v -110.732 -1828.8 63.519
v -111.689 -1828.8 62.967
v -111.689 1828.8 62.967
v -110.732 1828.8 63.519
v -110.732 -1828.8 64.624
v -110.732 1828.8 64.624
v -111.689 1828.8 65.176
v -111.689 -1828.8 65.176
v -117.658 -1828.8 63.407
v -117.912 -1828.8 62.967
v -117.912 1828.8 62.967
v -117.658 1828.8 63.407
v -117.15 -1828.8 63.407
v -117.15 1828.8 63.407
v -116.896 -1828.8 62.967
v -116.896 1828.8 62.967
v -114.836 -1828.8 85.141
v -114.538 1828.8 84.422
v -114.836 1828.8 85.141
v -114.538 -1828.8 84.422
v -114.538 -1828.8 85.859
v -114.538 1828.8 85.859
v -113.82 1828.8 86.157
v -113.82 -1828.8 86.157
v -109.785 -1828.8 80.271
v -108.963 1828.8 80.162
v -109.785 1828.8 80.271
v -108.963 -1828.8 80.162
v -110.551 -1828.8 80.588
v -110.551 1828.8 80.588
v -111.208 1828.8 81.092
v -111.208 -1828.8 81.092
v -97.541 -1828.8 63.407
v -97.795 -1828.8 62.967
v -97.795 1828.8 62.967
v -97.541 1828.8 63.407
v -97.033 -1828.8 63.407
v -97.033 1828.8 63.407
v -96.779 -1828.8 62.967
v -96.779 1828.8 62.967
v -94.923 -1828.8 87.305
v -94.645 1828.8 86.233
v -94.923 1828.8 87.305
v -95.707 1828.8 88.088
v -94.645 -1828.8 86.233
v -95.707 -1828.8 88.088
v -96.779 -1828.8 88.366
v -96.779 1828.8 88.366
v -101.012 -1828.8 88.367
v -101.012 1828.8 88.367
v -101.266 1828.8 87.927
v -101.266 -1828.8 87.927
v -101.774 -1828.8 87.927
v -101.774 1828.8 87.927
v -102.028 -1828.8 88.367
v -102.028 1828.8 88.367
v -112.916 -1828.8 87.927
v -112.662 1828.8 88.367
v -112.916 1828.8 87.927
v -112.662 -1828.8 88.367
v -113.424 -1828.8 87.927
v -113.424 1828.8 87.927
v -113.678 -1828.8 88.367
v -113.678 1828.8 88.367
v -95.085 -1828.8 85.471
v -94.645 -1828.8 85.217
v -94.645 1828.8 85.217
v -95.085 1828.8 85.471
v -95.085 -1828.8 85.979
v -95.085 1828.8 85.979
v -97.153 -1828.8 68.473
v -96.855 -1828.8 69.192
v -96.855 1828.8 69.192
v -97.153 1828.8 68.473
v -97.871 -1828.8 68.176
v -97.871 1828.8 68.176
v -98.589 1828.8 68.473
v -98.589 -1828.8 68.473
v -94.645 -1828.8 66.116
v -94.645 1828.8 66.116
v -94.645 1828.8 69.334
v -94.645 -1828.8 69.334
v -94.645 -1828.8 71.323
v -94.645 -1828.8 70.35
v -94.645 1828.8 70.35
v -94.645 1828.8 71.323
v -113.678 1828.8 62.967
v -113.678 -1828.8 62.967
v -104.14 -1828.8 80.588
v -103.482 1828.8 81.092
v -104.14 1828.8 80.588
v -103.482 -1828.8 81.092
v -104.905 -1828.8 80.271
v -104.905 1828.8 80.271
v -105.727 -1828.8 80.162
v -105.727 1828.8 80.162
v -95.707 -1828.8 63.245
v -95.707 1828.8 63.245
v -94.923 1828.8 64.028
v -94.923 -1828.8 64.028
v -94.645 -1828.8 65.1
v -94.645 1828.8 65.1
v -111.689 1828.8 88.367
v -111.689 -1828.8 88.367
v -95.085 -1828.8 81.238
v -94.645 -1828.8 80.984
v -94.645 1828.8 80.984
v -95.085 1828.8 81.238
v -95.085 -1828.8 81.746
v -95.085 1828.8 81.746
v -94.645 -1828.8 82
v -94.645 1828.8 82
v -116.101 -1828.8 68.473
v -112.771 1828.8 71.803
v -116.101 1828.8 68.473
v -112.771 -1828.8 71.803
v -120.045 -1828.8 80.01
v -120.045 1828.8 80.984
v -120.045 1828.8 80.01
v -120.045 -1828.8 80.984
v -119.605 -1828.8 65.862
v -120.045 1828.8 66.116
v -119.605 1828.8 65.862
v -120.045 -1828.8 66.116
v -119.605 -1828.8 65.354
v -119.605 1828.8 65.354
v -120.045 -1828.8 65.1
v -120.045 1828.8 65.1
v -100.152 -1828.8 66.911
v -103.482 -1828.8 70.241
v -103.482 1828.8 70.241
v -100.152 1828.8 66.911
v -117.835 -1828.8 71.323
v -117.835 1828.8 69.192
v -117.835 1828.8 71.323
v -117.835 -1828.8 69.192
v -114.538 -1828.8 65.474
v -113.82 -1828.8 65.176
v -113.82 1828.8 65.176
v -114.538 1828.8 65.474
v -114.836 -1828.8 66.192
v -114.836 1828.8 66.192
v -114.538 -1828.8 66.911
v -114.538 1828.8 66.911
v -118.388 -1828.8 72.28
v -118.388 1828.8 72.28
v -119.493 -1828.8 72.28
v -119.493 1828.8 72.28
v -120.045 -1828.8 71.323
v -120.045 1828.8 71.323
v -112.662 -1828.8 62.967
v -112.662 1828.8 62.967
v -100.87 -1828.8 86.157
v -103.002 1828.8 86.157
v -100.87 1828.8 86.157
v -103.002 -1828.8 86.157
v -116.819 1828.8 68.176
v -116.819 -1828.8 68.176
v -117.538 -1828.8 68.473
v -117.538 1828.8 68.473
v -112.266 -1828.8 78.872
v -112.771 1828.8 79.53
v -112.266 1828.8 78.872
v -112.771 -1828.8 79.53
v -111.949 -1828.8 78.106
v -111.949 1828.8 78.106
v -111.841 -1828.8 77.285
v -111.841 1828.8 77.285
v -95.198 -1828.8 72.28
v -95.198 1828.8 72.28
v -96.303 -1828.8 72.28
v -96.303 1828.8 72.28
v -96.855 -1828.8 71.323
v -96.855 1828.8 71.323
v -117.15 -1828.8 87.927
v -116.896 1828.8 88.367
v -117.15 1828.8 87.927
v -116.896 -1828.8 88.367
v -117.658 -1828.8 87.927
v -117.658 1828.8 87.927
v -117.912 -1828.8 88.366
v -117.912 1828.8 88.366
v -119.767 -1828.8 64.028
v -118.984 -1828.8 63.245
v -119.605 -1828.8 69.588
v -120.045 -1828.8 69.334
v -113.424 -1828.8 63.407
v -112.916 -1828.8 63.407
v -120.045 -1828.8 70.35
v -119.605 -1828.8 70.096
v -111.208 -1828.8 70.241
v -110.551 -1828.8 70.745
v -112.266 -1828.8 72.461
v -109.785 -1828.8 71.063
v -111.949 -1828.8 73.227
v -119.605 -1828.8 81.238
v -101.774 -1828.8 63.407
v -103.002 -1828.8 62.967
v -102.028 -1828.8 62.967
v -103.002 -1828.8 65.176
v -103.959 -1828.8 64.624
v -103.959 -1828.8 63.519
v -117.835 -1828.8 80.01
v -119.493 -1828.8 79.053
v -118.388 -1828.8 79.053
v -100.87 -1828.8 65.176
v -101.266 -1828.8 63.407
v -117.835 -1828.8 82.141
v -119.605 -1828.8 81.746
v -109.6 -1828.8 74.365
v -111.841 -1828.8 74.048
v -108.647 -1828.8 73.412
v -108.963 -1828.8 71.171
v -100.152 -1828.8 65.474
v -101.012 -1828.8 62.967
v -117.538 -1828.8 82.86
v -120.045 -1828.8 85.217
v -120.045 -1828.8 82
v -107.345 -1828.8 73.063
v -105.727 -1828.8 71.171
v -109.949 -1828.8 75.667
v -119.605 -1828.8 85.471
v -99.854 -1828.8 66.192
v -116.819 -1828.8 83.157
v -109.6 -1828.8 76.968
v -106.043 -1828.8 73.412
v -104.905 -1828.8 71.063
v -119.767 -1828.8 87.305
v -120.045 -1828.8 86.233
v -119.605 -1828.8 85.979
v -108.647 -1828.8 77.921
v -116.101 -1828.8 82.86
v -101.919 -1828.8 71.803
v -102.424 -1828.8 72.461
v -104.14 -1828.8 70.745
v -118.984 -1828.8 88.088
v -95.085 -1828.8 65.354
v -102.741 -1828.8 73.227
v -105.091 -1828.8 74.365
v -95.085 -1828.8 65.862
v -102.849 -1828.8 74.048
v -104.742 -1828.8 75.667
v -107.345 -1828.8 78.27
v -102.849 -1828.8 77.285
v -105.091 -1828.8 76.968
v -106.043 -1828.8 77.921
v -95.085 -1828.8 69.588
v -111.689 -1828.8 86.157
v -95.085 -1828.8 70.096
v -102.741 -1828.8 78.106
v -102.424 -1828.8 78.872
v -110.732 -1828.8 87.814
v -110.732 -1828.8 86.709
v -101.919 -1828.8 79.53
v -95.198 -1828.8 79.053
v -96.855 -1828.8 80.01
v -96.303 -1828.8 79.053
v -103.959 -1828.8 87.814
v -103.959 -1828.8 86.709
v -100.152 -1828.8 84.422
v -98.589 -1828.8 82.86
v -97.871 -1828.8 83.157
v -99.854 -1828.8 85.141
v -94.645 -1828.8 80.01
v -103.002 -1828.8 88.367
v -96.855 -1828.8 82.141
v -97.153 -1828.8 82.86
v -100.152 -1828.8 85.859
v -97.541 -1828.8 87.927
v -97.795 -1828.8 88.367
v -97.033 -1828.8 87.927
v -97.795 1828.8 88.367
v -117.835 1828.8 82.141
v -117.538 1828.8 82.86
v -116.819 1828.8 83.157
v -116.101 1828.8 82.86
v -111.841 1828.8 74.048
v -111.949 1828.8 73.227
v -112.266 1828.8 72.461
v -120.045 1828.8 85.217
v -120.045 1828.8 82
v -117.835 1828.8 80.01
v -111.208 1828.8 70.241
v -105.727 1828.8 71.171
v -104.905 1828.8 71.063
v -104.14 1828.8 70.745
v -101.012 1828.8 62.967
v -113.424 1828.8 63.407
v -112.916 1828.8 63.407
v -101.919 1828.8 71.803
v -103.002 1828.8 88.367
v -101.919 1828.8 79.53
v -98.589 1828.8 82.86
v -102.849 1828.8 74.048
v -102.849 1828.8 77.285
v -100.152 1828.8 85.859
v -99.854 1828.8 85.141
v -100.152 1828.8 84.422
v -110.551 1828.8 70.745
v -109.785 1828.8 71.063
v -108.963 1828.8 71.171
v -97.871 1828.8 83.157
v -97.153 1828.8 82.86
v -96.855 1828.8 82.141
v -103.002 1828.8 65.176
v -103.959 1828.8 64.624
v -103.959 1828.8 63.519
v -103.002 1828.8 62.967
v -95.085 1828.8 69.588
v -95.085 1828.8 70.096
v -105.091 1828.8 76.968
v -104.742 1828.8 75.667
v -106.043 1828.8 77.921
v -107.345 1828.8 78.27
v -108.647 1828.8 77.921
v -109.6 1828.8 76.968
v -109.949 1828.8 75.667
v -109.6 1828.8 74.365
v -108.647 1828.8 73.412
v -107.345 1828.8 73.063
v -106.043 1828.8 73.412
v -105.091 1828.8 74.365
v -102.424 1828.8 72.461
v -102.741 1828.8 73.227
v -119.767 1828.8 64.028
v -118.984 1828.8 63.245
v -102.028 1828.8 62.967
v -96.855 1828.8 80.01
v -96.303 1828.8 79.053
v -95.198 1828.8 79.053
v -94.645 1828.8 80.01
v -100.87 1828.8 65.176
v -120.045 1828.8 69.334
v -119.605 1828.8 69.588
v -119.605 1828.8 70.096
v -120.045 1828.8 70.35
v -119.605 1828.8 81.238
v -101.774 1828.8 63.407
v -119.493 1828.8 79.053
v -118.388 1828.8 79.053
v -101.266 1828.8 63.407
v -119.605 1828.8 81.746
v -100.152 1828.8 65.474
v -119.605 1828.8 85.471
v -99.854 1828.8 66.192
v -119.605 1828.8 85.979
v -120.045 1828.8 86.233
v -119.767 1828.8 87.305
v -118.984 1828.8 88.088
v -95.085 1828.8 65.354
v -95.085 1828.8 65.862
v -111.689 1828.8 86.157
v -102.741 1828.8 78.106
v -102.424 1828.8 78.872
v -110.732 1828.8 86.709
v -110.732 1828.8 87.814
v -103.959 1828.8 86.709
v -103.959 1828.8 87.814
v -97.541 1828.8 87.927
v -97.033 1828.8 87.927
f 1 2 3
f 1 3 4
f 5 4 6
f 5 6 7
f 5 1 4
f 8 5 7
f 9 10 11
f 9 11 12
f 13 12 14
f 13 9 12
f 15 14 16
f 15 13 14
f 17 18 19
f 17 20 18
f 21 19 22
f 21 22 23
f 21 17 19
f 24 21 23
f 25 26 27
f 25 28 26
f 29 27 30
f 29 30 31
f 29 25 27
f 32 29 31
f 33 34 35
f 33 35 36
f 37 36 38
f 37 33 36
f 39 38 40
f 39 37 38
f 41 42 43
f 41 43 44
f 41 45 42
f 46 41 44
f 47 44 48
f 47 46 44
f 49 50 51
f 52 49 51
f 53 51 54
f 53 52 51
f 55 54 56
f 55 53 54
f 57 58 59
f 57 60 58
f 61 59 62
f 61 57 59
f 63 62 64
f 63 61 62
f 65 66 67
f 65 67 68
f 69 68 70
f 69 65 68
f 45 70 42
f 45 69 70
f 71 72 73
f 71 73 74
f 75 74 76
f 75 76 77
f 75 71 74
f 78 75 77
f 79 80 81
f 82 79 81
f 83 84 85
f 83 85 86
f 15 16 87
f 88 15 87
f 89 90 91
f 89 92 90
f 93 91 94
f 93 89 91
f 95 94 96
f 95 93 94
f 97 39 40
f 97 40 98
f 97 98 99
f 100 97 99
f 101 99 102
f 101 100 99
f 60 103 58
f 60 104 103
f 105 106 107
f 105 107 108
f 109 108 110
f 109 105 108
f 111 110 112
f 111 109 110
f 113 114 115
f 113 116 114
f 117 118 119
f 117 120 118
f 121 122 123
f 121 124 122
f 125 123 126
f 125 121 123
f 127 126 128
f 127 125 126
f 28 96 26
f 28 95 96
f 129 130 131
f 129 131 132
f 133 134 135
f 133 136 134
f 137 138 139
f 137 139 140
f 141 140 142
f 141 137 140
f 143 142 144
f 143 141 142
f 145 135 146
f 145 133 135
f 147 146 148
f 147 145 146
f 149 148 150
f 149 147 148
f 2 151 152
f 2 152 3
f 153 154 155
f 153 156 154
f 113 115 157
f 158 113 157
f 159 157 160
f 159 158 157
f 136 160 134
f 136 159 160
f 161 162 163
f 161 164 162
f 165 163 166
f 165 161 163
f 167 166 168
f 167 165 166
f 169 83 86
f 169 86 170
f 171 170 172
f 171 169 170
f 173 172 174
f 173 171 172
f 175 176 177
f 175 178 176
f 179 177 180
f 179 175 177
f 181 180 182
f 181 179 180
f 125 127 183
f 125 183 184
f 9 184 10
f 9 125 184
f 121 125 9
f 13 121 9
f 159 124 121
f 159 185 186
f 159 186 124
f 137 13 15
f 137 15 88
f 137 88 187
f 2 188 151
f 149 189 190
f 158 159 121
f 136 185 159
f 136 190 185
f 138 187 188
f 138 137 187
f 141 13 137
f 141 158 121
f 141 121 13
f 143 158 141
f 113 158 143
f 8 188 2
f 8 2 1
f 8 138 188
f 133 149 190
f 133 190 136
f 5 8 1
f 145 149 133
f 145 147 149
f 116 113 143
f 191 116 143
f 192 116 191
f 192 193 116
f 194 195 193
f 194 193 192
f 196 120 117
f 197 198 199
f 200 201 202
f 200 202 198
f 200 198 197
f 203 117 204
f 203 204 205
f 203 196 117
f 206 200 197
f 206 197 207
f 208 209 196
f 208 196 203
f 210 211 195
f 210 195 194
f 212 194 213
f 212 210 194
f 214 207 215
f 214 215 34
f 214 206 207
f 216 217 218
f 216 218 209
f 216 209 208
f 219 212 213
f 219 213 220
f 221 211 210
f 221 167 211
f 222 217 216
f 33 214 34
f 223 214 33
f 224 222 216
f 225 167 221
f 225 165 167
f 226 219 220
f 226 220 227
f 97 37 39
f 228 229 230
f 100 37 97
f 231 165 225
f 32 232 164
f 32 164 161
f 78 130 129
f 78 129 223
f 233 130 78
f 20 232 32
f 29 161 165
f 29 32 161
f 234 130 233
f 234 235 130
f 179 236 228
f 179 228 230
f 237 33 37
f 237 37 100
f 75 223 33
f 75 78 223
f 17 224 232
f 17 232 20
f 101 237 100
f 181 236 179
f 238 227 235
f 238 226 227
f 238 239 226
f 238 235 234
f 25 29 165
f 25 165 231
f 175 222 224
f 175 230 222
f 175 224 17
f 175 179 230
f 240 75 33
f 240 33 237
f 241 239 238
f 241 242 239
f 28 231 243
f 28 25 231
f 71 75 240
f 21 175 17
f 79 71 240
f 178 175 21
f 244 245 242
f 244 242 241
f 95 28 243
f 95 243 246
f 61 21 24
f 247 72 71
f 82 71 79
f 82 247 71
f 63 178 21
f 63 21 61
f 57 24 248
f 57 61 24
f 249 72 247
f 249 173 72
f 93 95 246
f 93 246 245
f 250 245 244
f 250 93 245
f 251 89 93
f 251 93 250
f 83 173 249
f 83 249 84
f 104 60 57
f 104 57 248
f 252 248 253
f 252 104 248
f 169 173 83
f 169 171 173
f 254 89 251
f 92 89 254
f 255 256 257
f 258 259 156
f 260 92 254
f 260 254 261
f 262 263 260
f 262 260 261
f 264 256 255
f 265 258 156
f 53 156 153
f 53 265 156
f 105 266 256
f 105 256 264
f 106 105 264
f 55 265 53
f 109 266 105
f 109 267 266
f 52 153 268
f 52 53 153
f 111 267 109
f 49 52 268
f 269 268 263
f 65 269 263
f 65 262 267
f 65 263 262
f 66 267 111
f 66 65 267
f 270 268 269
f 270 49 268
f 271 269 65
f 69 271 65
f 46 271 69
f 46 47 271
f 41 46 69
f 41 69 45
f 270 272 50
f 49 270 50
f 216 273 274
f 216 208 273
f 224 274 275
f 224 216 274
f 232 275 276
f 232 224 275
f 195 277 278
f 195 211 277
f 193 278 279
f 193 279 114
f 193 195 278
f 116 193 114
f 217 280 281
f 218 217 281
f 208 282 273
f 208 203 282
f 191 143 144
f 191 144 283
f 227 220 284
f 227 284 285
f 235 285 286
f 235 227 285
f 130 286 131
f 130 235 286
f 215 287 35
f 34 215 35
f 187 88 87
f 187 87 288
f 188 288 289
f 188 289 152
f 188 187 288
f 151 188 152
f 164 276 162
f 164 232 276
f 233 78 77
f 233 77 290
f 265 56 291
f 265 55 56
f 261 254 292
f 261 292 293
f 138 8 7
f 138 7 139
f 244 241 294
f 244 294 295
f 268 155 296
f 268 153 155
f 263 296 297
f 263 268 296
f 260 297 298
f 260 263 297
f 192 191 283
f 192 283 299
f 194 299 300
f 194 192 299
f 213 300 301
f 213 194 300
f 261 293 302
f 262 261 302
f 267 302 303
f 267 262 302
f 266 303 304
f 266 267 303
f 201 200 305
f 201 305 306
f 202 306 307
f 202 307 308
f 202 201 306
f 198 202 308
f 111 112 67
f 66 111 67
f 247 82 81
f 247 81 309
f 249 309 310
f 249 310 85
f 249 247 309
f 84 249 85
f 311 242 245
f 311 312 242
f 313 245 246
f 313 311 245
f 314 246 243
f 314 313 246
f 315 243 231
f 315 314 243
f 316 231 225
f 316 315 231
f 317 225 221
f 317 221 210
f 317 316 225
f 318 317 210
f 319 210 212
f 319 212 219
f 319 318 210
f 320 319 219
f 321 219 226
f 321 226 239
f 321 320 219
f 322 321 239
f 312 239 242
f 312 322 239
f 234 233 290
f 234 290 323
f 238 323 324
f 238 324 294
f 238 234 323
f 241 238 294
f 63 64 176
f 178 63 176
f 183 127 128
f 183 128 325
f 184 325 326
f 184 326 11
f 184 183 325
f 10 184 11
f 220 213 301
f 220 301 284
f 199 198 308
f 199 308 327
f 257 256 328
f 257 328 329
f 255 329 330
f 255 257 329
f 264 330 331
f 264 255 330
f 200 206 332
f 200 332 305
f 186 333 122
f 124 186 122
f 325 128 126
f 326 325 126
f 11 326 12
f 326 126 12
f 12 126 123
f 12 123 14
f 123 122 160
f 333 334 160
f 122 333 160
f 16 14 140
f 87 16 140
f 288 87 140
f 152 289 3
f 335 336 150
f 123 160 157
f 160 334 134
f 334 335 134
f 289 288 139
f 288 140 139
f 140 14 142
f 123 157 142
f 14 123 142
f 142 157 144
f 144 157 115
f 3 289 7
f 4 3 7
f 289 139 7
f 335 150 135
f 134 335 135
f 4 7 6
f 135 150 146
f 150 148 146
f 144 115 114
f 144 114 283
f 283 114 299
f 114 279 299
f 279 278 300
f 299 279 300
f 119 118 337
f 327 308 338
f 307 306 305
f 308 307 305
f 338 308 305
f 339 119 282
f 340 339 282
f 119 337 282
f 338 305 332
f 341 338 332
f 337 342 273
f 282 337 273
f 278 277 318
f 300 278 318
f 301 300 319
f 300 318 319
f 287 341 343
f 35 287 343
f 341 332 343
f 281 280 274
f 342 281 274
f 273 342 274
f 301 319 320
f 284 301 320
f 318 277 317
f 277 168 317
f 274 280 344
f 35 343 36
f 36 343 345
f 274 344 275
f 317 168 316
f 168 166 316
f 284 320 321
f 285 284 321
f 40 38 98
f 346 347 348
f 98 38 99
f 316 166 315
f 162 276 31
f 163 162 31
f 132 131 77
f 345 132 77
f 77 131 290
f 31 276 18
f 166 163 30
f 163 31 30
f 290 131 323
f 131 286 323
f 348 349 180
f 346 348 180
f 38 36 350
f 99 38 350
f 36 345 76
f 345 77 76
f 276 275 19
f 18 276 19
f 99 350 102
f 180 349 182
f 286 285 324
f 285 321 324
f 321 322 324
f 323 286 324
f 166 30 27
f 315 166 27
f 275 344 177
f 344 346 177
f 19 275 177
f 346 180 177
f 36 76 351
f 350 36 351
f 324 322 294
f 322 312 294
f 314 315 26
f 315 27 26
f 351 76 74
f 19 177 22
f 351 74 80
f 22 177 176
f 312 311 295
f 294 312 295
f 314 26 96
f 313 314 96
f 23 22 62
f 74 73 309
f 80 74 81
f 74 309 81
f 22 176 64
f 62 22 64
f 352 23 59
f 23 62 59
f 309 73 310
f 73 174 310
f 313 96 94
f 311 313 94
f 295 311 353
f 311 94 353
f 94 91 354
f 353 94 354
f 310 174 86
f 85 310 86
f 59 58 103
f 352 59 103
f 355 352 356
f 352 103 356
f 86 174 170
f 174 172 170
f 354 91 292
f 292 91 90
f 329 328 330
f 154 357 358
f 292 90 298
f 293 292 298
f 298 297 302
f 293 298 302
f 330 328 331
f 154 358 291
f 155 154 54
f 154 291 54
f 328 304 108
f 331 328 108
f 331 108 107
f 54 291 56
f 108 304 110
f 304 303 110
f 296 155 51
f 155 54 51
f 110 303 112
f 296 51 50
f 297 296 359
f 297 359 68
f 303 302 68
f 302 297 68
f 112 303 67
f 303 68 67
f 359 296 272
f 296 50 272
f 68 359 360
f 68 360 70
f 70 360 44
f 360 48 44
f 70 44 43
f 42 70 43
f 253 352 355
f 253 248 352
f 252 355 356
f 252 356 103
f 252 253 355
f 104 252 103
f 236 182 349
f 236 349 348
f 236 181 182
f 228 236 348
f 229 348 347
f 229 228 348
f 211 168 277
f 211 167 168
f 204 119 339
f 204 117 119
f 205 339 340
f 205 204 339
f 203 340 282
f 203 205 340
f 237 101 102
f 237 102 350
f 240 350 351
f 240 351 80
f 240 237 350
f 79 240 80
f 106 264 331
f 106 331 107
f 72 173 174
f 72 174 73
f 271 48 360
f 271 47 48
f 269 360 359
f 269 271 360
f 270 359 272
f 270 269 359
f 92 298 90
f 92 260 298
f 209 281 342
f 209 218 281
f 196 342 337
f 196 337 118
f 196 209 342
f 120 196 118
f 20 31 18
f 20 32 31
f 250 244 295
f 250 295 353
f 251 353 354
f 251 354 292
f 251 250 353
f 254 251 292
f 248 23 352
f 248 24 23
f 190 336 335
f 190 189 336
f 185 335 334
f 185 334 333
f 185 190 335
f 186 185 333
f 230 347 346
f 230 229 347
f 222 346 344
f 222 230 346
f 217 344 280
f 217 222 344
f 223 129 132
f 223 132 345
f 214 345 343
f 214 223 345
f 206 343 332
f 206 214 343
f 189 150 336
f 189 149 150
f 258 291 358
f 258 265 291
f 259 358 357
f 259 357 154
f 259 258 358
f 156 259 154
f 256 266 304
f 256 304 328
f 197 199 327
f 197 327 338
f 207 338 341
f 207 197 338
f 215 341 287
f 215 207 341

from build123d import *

# Parameters (mm, degrees)
F0_R     = 2.6035
F1_DEPTH = 1828.8


# Not quite as in the source:
# - ends of sketch curves that miss each other by under 0.0002 mm in the source are joined


with BuildPart() as f1:
    # F0 (on Front) → F1 (new body, symmetric)
    with BuildSketch(Plane.XZ):
        with BuildLine():
            ThreePointArc((-120.045226, 66.1162), (-119.5372260057, 65.6082762), (-120.0450736, 65.1002000229))
            ThreePointArc((-120.0450736, 65.1002000229), (-119.4277485161, 63.5840774839), (-117.9116260074, 62.9667530175))
            ThreePointArc((-117.9116260074, 62.9667530175), (-117.4035498, 63.4745999943), (-116.895626, 62.9666))
            Line((-116.895626, 62.9666), (-113.6783096, 62.9666))
            ThreePointArc((-113.6783096, 62.9666), (-113.1703096, 63.4746), (-112.6623096, 62.9666))
            Line((-112.6623096, 62.9666), (-111.688626, 62.9666))
            ThreePointArc((-111.688626, 62.9666), (-110.583726, 64.0715), (-111.688626, 65.1764))
            Line((-111.688626, 65.1764), (-113.8200162, 65.1764))
            ThreePointArc((-113.8200162, 65.1764), (-114.758677805, 65.8035936327), (-114.5384366897, 66.9108204897))
            Line((-114.5384366897, 66.9108204897), (-111.2083882, 70.2408552))
            ThreePointArc((-111.2083882, 70.2408552), (-110.1783528978, 70.9291175157), (-108.963333, 71.1708))
            Line((-108.963333, 71.1708), (-105.727119, 71.1708))
            ThreePointArc((-105.727119, 71.1708), (-104.5120991022, 70.9291175157), (-103.4820549697, 70.2408640303))
            Line((-103.4820549697, 70.2408640303), (-100.1520222, 66.9108136))
            ThreePointArc((-100.1520222, 66.9108136), (-99.931774195, 65.8035936327), (-100.8704358, 65.1764))
            Line((-100.8704358, 65.1764), (-103.001826, 65.1764))
            ThreePointArc((-103.001826, 65.1764), (-104.106726, 64.0715), (-103.001826, 62.9666))
            Line((-103.001826, 62.9666), (-102.0281424, 62.9666))
            ThreePointArc((-102.0281424, 62.9666), (-101.5201424, 63.4746), (-101.0121424, 62.9666))
            Line((-101.0121424, 62.9666), (-97.794826, 62.9666))
            ThreePointArc((-97.794826, 62.9666), (-97.2869022, 63.4745999943), (-96.7788260229, 62.9667524))
            ThreePointArc((-96.7788260229, 62.9667524), (-95.2627034839, 63.5840774839), (-94.6453790175, 65.1001999926))
            ThreePointArc((-94.6453790175, 65.1001999926), (-95.1532259943, 65.6082762), (-94.645226, 66.1162))
            Line((-94.645226, 66.1162), (-94.645226, 69.3335164))
            ThreePointArc((-94.645226, 69.3335164), (-95.153226, 69.8415164), (-94.645226, 70.3495164))
            Line((-94.645226, 70.3495164), (-94.645226, 71.3232))
            ThreePointArc((-94.645226, 71.3232), (-95.750126, 72.4281), (-96.855026, 71.3232))
            Line((-96.855026, 71.3232), (-96.855026, 69.1918098))
            ThreePointArc((-96.855026, 69.1918098), (-97.4822196327, 68.253148195), (-98.5894464897, 68.4733893103))
            Line((-98.5894464897, 68.4733893103), (-101.9194812, 71.8034378))
            ThreePointArc((-101.9194812, 71.8034378), (-102.6077435157, 72.8334731022), (-102.849426, 74.048493))
            Line((-102.849426, 74.048493), (-102.849426, 77.284707))
            ThreePointArc((-102.849426, 77.284707), (-102.6077435157, 78.4997268978), (-101.9194900303, 79.5297710303))
            Line((-101.9194900303, 79.5297710303), (-98.5894396, 82.8598038))
            ThreePointArc((-98.5894396, 82.8598038), (-97.4822196327, 83.080051805), (-96.855026, 82.1413902))
            Line((-96.855026, 82.1413902), (-96.855026, 80.01))
            ThreePointArc((-96.855026, 80.01), (-95.750126, 78.9051), (-94.645226, 80.01))
            Line((-94.645226, 80.01), (-94.645226, 80.9836836))
            ThreePointArc((-94.645226, 80.9836836), (-95.153226, 81.4916836), (-94.645226, 81.9996836))
            Line((-94.645226, 81.9996836), (-94.645226, 85.217))
            ThreePointArc((-94.645226, 85.217), (-95.1532259943, 85.7249238), (-94.6453784, 86.2329999771))
            ThreePointArc((-94.6453784, 86.2329999771), (-95.2627034839, 87.7491225161), (-96.7788259926, 88.3664469825))
            ThreePointArc((-96.7788259926, 88.3664469825), (-97.2869022, 87.8586000057), (-97.794826, 88.3666))
            Line((-97.794826, 88.3666), (-101.0121424, 88.3666))
            ThreePointArc((-101.0121424, 88.3666), (-101.5201424, 87.8586), (-102.0281424, 88.3666))
            Line((-102.0281424, 88.3666), (-103.001826, 88.3666))
            ThreePointArc((-103.001826, 88.3666), (-104.106726, 87.2617), (-103.001826, 86.1568))
            Line((-103.001826, 86.1568), (-100.8704358, 86.1568))
            ThreePointArc((-100.8704358, 86.1568), (-99.931774195, 85.5296063673), (-100.1520153103, 84.4223795103))
            Line((-100.1520153103, 84.4223795103), (-103.4820638, 81.0923448))
            ThreePointArc((-103.4820638, 81.0923448), (-104.5120991022, 80.4040824843), (-105.727119, 80.1624))
            Line((-105.727119, 80.1624), (-108.963333, 80.1624))
            ThreePointArc((-108.963333, 80.1624), (-110.1783528978, 80.4040824843), (-111.2083970303, 81.0923359697))
            Line((-111.2083970303, 81.0923359697), (-114.5384298, 84.4223864))
            ThreePointArc((-114.5384298, 84.4223864), (-114.758677805, 85.5296063673), (-113.8200162, 86.1568))
            Line((-113.8200162, 86.1568), (-111.688626, 86.1568))
            ThreePointArc((-111.688626, 86.1568), (-110.583726, 87.2617), (-111.688626, 88.3666))
            Line((-111.688626, 88.3666), (-112.6623096, 88.3666))
            ThreePointArc((-112.6623096, 88.3666), (-113.1703096, 87.8586), (-113.6783096, 88.3666))
            Line((-113.6783096, 88.3666), (-116.895626, 88.3666))
            ThreePointArc((-116.895626, 88.3666), (-117.4035498, 87.8586000057), (-117.9116259771, 88.3664476))
            ThreePointArc((-117.9116259771, 88.3664476), (-119.4277485161, 87.7491225161), (-120.0450729825, 86.2330000074))
            ThreePointArc((-120.0450729825, 86.2330000074), (-119.5372260057, 85.7249238), (-120.045226, 85.217))
            Line((-120.045226, 85.217), (-120.045226, 81.9996836))
            ThreePointArc((-120.045226, 81.9996836), (-119.537226, 81.4916836), (-120.045226, 80.9836836))
            Line((-120.045226, 80.9836836), (-120.045226, 80.01))
            ThreePointArc((-120.045226, 80.01), (-118.940326, 78.9051), (-117.835426, 80.01))
            Line((-117.835426, 80.01), (-117.835426, 82.1413902))
            ThreePointArc((-117.835426, 82.1413902), (-117.2082323673, 83.080051805), (-116.1010055103, 82.8598106897))
            Line((-116.1010055103, 82.8598106897), (-112.7709708, 79.5297622))
            ThreePointArc((-112.7709708, 79.5297622), (-112.0827084843, 78.4997268978), (-111.841026, 77.284707))
            Line((-111.841026, 77.284707), (-111.841026, 74.048493))
            ThreePointArc((-111.841026, 74.048493), (-112.0827084843, 72.8334731022), (-112.7709619697, 71.8034289697))
            Line((-112.7709619697, 71.8034289697), (-116.1010124, 68.4733962))
            ThreePointArc((-116.1010124, 68.4733962), (-117.2082323673, 68.253148195), (-117.835426, 69.1918098))
            Line((-117.835426, 69.1918098), (-117.835426, 71.3232))
            ThreePointArc((-117.835426, 71.3232), (-118.940326, 72.4281), (-120.045226, 71.3232))
            Line((-120.045226, 71.3232), (-120.045226, 70.3495164))
            ThreePointArc((-120.045226, 70.3495164), (-119.537226, 69.8415164), (-120.045226, 69.3335164))
            Line((-120.045226, 69.3335164), (-120.045226, 66.1162))
        make_face()
        with Locations((-107.345226, 75.6666)):
            Circle(F0_R, mode=Mode.SUBTRACT)
    extrude(amount=F1_DEPTH, both=True)


solid = f1.part
